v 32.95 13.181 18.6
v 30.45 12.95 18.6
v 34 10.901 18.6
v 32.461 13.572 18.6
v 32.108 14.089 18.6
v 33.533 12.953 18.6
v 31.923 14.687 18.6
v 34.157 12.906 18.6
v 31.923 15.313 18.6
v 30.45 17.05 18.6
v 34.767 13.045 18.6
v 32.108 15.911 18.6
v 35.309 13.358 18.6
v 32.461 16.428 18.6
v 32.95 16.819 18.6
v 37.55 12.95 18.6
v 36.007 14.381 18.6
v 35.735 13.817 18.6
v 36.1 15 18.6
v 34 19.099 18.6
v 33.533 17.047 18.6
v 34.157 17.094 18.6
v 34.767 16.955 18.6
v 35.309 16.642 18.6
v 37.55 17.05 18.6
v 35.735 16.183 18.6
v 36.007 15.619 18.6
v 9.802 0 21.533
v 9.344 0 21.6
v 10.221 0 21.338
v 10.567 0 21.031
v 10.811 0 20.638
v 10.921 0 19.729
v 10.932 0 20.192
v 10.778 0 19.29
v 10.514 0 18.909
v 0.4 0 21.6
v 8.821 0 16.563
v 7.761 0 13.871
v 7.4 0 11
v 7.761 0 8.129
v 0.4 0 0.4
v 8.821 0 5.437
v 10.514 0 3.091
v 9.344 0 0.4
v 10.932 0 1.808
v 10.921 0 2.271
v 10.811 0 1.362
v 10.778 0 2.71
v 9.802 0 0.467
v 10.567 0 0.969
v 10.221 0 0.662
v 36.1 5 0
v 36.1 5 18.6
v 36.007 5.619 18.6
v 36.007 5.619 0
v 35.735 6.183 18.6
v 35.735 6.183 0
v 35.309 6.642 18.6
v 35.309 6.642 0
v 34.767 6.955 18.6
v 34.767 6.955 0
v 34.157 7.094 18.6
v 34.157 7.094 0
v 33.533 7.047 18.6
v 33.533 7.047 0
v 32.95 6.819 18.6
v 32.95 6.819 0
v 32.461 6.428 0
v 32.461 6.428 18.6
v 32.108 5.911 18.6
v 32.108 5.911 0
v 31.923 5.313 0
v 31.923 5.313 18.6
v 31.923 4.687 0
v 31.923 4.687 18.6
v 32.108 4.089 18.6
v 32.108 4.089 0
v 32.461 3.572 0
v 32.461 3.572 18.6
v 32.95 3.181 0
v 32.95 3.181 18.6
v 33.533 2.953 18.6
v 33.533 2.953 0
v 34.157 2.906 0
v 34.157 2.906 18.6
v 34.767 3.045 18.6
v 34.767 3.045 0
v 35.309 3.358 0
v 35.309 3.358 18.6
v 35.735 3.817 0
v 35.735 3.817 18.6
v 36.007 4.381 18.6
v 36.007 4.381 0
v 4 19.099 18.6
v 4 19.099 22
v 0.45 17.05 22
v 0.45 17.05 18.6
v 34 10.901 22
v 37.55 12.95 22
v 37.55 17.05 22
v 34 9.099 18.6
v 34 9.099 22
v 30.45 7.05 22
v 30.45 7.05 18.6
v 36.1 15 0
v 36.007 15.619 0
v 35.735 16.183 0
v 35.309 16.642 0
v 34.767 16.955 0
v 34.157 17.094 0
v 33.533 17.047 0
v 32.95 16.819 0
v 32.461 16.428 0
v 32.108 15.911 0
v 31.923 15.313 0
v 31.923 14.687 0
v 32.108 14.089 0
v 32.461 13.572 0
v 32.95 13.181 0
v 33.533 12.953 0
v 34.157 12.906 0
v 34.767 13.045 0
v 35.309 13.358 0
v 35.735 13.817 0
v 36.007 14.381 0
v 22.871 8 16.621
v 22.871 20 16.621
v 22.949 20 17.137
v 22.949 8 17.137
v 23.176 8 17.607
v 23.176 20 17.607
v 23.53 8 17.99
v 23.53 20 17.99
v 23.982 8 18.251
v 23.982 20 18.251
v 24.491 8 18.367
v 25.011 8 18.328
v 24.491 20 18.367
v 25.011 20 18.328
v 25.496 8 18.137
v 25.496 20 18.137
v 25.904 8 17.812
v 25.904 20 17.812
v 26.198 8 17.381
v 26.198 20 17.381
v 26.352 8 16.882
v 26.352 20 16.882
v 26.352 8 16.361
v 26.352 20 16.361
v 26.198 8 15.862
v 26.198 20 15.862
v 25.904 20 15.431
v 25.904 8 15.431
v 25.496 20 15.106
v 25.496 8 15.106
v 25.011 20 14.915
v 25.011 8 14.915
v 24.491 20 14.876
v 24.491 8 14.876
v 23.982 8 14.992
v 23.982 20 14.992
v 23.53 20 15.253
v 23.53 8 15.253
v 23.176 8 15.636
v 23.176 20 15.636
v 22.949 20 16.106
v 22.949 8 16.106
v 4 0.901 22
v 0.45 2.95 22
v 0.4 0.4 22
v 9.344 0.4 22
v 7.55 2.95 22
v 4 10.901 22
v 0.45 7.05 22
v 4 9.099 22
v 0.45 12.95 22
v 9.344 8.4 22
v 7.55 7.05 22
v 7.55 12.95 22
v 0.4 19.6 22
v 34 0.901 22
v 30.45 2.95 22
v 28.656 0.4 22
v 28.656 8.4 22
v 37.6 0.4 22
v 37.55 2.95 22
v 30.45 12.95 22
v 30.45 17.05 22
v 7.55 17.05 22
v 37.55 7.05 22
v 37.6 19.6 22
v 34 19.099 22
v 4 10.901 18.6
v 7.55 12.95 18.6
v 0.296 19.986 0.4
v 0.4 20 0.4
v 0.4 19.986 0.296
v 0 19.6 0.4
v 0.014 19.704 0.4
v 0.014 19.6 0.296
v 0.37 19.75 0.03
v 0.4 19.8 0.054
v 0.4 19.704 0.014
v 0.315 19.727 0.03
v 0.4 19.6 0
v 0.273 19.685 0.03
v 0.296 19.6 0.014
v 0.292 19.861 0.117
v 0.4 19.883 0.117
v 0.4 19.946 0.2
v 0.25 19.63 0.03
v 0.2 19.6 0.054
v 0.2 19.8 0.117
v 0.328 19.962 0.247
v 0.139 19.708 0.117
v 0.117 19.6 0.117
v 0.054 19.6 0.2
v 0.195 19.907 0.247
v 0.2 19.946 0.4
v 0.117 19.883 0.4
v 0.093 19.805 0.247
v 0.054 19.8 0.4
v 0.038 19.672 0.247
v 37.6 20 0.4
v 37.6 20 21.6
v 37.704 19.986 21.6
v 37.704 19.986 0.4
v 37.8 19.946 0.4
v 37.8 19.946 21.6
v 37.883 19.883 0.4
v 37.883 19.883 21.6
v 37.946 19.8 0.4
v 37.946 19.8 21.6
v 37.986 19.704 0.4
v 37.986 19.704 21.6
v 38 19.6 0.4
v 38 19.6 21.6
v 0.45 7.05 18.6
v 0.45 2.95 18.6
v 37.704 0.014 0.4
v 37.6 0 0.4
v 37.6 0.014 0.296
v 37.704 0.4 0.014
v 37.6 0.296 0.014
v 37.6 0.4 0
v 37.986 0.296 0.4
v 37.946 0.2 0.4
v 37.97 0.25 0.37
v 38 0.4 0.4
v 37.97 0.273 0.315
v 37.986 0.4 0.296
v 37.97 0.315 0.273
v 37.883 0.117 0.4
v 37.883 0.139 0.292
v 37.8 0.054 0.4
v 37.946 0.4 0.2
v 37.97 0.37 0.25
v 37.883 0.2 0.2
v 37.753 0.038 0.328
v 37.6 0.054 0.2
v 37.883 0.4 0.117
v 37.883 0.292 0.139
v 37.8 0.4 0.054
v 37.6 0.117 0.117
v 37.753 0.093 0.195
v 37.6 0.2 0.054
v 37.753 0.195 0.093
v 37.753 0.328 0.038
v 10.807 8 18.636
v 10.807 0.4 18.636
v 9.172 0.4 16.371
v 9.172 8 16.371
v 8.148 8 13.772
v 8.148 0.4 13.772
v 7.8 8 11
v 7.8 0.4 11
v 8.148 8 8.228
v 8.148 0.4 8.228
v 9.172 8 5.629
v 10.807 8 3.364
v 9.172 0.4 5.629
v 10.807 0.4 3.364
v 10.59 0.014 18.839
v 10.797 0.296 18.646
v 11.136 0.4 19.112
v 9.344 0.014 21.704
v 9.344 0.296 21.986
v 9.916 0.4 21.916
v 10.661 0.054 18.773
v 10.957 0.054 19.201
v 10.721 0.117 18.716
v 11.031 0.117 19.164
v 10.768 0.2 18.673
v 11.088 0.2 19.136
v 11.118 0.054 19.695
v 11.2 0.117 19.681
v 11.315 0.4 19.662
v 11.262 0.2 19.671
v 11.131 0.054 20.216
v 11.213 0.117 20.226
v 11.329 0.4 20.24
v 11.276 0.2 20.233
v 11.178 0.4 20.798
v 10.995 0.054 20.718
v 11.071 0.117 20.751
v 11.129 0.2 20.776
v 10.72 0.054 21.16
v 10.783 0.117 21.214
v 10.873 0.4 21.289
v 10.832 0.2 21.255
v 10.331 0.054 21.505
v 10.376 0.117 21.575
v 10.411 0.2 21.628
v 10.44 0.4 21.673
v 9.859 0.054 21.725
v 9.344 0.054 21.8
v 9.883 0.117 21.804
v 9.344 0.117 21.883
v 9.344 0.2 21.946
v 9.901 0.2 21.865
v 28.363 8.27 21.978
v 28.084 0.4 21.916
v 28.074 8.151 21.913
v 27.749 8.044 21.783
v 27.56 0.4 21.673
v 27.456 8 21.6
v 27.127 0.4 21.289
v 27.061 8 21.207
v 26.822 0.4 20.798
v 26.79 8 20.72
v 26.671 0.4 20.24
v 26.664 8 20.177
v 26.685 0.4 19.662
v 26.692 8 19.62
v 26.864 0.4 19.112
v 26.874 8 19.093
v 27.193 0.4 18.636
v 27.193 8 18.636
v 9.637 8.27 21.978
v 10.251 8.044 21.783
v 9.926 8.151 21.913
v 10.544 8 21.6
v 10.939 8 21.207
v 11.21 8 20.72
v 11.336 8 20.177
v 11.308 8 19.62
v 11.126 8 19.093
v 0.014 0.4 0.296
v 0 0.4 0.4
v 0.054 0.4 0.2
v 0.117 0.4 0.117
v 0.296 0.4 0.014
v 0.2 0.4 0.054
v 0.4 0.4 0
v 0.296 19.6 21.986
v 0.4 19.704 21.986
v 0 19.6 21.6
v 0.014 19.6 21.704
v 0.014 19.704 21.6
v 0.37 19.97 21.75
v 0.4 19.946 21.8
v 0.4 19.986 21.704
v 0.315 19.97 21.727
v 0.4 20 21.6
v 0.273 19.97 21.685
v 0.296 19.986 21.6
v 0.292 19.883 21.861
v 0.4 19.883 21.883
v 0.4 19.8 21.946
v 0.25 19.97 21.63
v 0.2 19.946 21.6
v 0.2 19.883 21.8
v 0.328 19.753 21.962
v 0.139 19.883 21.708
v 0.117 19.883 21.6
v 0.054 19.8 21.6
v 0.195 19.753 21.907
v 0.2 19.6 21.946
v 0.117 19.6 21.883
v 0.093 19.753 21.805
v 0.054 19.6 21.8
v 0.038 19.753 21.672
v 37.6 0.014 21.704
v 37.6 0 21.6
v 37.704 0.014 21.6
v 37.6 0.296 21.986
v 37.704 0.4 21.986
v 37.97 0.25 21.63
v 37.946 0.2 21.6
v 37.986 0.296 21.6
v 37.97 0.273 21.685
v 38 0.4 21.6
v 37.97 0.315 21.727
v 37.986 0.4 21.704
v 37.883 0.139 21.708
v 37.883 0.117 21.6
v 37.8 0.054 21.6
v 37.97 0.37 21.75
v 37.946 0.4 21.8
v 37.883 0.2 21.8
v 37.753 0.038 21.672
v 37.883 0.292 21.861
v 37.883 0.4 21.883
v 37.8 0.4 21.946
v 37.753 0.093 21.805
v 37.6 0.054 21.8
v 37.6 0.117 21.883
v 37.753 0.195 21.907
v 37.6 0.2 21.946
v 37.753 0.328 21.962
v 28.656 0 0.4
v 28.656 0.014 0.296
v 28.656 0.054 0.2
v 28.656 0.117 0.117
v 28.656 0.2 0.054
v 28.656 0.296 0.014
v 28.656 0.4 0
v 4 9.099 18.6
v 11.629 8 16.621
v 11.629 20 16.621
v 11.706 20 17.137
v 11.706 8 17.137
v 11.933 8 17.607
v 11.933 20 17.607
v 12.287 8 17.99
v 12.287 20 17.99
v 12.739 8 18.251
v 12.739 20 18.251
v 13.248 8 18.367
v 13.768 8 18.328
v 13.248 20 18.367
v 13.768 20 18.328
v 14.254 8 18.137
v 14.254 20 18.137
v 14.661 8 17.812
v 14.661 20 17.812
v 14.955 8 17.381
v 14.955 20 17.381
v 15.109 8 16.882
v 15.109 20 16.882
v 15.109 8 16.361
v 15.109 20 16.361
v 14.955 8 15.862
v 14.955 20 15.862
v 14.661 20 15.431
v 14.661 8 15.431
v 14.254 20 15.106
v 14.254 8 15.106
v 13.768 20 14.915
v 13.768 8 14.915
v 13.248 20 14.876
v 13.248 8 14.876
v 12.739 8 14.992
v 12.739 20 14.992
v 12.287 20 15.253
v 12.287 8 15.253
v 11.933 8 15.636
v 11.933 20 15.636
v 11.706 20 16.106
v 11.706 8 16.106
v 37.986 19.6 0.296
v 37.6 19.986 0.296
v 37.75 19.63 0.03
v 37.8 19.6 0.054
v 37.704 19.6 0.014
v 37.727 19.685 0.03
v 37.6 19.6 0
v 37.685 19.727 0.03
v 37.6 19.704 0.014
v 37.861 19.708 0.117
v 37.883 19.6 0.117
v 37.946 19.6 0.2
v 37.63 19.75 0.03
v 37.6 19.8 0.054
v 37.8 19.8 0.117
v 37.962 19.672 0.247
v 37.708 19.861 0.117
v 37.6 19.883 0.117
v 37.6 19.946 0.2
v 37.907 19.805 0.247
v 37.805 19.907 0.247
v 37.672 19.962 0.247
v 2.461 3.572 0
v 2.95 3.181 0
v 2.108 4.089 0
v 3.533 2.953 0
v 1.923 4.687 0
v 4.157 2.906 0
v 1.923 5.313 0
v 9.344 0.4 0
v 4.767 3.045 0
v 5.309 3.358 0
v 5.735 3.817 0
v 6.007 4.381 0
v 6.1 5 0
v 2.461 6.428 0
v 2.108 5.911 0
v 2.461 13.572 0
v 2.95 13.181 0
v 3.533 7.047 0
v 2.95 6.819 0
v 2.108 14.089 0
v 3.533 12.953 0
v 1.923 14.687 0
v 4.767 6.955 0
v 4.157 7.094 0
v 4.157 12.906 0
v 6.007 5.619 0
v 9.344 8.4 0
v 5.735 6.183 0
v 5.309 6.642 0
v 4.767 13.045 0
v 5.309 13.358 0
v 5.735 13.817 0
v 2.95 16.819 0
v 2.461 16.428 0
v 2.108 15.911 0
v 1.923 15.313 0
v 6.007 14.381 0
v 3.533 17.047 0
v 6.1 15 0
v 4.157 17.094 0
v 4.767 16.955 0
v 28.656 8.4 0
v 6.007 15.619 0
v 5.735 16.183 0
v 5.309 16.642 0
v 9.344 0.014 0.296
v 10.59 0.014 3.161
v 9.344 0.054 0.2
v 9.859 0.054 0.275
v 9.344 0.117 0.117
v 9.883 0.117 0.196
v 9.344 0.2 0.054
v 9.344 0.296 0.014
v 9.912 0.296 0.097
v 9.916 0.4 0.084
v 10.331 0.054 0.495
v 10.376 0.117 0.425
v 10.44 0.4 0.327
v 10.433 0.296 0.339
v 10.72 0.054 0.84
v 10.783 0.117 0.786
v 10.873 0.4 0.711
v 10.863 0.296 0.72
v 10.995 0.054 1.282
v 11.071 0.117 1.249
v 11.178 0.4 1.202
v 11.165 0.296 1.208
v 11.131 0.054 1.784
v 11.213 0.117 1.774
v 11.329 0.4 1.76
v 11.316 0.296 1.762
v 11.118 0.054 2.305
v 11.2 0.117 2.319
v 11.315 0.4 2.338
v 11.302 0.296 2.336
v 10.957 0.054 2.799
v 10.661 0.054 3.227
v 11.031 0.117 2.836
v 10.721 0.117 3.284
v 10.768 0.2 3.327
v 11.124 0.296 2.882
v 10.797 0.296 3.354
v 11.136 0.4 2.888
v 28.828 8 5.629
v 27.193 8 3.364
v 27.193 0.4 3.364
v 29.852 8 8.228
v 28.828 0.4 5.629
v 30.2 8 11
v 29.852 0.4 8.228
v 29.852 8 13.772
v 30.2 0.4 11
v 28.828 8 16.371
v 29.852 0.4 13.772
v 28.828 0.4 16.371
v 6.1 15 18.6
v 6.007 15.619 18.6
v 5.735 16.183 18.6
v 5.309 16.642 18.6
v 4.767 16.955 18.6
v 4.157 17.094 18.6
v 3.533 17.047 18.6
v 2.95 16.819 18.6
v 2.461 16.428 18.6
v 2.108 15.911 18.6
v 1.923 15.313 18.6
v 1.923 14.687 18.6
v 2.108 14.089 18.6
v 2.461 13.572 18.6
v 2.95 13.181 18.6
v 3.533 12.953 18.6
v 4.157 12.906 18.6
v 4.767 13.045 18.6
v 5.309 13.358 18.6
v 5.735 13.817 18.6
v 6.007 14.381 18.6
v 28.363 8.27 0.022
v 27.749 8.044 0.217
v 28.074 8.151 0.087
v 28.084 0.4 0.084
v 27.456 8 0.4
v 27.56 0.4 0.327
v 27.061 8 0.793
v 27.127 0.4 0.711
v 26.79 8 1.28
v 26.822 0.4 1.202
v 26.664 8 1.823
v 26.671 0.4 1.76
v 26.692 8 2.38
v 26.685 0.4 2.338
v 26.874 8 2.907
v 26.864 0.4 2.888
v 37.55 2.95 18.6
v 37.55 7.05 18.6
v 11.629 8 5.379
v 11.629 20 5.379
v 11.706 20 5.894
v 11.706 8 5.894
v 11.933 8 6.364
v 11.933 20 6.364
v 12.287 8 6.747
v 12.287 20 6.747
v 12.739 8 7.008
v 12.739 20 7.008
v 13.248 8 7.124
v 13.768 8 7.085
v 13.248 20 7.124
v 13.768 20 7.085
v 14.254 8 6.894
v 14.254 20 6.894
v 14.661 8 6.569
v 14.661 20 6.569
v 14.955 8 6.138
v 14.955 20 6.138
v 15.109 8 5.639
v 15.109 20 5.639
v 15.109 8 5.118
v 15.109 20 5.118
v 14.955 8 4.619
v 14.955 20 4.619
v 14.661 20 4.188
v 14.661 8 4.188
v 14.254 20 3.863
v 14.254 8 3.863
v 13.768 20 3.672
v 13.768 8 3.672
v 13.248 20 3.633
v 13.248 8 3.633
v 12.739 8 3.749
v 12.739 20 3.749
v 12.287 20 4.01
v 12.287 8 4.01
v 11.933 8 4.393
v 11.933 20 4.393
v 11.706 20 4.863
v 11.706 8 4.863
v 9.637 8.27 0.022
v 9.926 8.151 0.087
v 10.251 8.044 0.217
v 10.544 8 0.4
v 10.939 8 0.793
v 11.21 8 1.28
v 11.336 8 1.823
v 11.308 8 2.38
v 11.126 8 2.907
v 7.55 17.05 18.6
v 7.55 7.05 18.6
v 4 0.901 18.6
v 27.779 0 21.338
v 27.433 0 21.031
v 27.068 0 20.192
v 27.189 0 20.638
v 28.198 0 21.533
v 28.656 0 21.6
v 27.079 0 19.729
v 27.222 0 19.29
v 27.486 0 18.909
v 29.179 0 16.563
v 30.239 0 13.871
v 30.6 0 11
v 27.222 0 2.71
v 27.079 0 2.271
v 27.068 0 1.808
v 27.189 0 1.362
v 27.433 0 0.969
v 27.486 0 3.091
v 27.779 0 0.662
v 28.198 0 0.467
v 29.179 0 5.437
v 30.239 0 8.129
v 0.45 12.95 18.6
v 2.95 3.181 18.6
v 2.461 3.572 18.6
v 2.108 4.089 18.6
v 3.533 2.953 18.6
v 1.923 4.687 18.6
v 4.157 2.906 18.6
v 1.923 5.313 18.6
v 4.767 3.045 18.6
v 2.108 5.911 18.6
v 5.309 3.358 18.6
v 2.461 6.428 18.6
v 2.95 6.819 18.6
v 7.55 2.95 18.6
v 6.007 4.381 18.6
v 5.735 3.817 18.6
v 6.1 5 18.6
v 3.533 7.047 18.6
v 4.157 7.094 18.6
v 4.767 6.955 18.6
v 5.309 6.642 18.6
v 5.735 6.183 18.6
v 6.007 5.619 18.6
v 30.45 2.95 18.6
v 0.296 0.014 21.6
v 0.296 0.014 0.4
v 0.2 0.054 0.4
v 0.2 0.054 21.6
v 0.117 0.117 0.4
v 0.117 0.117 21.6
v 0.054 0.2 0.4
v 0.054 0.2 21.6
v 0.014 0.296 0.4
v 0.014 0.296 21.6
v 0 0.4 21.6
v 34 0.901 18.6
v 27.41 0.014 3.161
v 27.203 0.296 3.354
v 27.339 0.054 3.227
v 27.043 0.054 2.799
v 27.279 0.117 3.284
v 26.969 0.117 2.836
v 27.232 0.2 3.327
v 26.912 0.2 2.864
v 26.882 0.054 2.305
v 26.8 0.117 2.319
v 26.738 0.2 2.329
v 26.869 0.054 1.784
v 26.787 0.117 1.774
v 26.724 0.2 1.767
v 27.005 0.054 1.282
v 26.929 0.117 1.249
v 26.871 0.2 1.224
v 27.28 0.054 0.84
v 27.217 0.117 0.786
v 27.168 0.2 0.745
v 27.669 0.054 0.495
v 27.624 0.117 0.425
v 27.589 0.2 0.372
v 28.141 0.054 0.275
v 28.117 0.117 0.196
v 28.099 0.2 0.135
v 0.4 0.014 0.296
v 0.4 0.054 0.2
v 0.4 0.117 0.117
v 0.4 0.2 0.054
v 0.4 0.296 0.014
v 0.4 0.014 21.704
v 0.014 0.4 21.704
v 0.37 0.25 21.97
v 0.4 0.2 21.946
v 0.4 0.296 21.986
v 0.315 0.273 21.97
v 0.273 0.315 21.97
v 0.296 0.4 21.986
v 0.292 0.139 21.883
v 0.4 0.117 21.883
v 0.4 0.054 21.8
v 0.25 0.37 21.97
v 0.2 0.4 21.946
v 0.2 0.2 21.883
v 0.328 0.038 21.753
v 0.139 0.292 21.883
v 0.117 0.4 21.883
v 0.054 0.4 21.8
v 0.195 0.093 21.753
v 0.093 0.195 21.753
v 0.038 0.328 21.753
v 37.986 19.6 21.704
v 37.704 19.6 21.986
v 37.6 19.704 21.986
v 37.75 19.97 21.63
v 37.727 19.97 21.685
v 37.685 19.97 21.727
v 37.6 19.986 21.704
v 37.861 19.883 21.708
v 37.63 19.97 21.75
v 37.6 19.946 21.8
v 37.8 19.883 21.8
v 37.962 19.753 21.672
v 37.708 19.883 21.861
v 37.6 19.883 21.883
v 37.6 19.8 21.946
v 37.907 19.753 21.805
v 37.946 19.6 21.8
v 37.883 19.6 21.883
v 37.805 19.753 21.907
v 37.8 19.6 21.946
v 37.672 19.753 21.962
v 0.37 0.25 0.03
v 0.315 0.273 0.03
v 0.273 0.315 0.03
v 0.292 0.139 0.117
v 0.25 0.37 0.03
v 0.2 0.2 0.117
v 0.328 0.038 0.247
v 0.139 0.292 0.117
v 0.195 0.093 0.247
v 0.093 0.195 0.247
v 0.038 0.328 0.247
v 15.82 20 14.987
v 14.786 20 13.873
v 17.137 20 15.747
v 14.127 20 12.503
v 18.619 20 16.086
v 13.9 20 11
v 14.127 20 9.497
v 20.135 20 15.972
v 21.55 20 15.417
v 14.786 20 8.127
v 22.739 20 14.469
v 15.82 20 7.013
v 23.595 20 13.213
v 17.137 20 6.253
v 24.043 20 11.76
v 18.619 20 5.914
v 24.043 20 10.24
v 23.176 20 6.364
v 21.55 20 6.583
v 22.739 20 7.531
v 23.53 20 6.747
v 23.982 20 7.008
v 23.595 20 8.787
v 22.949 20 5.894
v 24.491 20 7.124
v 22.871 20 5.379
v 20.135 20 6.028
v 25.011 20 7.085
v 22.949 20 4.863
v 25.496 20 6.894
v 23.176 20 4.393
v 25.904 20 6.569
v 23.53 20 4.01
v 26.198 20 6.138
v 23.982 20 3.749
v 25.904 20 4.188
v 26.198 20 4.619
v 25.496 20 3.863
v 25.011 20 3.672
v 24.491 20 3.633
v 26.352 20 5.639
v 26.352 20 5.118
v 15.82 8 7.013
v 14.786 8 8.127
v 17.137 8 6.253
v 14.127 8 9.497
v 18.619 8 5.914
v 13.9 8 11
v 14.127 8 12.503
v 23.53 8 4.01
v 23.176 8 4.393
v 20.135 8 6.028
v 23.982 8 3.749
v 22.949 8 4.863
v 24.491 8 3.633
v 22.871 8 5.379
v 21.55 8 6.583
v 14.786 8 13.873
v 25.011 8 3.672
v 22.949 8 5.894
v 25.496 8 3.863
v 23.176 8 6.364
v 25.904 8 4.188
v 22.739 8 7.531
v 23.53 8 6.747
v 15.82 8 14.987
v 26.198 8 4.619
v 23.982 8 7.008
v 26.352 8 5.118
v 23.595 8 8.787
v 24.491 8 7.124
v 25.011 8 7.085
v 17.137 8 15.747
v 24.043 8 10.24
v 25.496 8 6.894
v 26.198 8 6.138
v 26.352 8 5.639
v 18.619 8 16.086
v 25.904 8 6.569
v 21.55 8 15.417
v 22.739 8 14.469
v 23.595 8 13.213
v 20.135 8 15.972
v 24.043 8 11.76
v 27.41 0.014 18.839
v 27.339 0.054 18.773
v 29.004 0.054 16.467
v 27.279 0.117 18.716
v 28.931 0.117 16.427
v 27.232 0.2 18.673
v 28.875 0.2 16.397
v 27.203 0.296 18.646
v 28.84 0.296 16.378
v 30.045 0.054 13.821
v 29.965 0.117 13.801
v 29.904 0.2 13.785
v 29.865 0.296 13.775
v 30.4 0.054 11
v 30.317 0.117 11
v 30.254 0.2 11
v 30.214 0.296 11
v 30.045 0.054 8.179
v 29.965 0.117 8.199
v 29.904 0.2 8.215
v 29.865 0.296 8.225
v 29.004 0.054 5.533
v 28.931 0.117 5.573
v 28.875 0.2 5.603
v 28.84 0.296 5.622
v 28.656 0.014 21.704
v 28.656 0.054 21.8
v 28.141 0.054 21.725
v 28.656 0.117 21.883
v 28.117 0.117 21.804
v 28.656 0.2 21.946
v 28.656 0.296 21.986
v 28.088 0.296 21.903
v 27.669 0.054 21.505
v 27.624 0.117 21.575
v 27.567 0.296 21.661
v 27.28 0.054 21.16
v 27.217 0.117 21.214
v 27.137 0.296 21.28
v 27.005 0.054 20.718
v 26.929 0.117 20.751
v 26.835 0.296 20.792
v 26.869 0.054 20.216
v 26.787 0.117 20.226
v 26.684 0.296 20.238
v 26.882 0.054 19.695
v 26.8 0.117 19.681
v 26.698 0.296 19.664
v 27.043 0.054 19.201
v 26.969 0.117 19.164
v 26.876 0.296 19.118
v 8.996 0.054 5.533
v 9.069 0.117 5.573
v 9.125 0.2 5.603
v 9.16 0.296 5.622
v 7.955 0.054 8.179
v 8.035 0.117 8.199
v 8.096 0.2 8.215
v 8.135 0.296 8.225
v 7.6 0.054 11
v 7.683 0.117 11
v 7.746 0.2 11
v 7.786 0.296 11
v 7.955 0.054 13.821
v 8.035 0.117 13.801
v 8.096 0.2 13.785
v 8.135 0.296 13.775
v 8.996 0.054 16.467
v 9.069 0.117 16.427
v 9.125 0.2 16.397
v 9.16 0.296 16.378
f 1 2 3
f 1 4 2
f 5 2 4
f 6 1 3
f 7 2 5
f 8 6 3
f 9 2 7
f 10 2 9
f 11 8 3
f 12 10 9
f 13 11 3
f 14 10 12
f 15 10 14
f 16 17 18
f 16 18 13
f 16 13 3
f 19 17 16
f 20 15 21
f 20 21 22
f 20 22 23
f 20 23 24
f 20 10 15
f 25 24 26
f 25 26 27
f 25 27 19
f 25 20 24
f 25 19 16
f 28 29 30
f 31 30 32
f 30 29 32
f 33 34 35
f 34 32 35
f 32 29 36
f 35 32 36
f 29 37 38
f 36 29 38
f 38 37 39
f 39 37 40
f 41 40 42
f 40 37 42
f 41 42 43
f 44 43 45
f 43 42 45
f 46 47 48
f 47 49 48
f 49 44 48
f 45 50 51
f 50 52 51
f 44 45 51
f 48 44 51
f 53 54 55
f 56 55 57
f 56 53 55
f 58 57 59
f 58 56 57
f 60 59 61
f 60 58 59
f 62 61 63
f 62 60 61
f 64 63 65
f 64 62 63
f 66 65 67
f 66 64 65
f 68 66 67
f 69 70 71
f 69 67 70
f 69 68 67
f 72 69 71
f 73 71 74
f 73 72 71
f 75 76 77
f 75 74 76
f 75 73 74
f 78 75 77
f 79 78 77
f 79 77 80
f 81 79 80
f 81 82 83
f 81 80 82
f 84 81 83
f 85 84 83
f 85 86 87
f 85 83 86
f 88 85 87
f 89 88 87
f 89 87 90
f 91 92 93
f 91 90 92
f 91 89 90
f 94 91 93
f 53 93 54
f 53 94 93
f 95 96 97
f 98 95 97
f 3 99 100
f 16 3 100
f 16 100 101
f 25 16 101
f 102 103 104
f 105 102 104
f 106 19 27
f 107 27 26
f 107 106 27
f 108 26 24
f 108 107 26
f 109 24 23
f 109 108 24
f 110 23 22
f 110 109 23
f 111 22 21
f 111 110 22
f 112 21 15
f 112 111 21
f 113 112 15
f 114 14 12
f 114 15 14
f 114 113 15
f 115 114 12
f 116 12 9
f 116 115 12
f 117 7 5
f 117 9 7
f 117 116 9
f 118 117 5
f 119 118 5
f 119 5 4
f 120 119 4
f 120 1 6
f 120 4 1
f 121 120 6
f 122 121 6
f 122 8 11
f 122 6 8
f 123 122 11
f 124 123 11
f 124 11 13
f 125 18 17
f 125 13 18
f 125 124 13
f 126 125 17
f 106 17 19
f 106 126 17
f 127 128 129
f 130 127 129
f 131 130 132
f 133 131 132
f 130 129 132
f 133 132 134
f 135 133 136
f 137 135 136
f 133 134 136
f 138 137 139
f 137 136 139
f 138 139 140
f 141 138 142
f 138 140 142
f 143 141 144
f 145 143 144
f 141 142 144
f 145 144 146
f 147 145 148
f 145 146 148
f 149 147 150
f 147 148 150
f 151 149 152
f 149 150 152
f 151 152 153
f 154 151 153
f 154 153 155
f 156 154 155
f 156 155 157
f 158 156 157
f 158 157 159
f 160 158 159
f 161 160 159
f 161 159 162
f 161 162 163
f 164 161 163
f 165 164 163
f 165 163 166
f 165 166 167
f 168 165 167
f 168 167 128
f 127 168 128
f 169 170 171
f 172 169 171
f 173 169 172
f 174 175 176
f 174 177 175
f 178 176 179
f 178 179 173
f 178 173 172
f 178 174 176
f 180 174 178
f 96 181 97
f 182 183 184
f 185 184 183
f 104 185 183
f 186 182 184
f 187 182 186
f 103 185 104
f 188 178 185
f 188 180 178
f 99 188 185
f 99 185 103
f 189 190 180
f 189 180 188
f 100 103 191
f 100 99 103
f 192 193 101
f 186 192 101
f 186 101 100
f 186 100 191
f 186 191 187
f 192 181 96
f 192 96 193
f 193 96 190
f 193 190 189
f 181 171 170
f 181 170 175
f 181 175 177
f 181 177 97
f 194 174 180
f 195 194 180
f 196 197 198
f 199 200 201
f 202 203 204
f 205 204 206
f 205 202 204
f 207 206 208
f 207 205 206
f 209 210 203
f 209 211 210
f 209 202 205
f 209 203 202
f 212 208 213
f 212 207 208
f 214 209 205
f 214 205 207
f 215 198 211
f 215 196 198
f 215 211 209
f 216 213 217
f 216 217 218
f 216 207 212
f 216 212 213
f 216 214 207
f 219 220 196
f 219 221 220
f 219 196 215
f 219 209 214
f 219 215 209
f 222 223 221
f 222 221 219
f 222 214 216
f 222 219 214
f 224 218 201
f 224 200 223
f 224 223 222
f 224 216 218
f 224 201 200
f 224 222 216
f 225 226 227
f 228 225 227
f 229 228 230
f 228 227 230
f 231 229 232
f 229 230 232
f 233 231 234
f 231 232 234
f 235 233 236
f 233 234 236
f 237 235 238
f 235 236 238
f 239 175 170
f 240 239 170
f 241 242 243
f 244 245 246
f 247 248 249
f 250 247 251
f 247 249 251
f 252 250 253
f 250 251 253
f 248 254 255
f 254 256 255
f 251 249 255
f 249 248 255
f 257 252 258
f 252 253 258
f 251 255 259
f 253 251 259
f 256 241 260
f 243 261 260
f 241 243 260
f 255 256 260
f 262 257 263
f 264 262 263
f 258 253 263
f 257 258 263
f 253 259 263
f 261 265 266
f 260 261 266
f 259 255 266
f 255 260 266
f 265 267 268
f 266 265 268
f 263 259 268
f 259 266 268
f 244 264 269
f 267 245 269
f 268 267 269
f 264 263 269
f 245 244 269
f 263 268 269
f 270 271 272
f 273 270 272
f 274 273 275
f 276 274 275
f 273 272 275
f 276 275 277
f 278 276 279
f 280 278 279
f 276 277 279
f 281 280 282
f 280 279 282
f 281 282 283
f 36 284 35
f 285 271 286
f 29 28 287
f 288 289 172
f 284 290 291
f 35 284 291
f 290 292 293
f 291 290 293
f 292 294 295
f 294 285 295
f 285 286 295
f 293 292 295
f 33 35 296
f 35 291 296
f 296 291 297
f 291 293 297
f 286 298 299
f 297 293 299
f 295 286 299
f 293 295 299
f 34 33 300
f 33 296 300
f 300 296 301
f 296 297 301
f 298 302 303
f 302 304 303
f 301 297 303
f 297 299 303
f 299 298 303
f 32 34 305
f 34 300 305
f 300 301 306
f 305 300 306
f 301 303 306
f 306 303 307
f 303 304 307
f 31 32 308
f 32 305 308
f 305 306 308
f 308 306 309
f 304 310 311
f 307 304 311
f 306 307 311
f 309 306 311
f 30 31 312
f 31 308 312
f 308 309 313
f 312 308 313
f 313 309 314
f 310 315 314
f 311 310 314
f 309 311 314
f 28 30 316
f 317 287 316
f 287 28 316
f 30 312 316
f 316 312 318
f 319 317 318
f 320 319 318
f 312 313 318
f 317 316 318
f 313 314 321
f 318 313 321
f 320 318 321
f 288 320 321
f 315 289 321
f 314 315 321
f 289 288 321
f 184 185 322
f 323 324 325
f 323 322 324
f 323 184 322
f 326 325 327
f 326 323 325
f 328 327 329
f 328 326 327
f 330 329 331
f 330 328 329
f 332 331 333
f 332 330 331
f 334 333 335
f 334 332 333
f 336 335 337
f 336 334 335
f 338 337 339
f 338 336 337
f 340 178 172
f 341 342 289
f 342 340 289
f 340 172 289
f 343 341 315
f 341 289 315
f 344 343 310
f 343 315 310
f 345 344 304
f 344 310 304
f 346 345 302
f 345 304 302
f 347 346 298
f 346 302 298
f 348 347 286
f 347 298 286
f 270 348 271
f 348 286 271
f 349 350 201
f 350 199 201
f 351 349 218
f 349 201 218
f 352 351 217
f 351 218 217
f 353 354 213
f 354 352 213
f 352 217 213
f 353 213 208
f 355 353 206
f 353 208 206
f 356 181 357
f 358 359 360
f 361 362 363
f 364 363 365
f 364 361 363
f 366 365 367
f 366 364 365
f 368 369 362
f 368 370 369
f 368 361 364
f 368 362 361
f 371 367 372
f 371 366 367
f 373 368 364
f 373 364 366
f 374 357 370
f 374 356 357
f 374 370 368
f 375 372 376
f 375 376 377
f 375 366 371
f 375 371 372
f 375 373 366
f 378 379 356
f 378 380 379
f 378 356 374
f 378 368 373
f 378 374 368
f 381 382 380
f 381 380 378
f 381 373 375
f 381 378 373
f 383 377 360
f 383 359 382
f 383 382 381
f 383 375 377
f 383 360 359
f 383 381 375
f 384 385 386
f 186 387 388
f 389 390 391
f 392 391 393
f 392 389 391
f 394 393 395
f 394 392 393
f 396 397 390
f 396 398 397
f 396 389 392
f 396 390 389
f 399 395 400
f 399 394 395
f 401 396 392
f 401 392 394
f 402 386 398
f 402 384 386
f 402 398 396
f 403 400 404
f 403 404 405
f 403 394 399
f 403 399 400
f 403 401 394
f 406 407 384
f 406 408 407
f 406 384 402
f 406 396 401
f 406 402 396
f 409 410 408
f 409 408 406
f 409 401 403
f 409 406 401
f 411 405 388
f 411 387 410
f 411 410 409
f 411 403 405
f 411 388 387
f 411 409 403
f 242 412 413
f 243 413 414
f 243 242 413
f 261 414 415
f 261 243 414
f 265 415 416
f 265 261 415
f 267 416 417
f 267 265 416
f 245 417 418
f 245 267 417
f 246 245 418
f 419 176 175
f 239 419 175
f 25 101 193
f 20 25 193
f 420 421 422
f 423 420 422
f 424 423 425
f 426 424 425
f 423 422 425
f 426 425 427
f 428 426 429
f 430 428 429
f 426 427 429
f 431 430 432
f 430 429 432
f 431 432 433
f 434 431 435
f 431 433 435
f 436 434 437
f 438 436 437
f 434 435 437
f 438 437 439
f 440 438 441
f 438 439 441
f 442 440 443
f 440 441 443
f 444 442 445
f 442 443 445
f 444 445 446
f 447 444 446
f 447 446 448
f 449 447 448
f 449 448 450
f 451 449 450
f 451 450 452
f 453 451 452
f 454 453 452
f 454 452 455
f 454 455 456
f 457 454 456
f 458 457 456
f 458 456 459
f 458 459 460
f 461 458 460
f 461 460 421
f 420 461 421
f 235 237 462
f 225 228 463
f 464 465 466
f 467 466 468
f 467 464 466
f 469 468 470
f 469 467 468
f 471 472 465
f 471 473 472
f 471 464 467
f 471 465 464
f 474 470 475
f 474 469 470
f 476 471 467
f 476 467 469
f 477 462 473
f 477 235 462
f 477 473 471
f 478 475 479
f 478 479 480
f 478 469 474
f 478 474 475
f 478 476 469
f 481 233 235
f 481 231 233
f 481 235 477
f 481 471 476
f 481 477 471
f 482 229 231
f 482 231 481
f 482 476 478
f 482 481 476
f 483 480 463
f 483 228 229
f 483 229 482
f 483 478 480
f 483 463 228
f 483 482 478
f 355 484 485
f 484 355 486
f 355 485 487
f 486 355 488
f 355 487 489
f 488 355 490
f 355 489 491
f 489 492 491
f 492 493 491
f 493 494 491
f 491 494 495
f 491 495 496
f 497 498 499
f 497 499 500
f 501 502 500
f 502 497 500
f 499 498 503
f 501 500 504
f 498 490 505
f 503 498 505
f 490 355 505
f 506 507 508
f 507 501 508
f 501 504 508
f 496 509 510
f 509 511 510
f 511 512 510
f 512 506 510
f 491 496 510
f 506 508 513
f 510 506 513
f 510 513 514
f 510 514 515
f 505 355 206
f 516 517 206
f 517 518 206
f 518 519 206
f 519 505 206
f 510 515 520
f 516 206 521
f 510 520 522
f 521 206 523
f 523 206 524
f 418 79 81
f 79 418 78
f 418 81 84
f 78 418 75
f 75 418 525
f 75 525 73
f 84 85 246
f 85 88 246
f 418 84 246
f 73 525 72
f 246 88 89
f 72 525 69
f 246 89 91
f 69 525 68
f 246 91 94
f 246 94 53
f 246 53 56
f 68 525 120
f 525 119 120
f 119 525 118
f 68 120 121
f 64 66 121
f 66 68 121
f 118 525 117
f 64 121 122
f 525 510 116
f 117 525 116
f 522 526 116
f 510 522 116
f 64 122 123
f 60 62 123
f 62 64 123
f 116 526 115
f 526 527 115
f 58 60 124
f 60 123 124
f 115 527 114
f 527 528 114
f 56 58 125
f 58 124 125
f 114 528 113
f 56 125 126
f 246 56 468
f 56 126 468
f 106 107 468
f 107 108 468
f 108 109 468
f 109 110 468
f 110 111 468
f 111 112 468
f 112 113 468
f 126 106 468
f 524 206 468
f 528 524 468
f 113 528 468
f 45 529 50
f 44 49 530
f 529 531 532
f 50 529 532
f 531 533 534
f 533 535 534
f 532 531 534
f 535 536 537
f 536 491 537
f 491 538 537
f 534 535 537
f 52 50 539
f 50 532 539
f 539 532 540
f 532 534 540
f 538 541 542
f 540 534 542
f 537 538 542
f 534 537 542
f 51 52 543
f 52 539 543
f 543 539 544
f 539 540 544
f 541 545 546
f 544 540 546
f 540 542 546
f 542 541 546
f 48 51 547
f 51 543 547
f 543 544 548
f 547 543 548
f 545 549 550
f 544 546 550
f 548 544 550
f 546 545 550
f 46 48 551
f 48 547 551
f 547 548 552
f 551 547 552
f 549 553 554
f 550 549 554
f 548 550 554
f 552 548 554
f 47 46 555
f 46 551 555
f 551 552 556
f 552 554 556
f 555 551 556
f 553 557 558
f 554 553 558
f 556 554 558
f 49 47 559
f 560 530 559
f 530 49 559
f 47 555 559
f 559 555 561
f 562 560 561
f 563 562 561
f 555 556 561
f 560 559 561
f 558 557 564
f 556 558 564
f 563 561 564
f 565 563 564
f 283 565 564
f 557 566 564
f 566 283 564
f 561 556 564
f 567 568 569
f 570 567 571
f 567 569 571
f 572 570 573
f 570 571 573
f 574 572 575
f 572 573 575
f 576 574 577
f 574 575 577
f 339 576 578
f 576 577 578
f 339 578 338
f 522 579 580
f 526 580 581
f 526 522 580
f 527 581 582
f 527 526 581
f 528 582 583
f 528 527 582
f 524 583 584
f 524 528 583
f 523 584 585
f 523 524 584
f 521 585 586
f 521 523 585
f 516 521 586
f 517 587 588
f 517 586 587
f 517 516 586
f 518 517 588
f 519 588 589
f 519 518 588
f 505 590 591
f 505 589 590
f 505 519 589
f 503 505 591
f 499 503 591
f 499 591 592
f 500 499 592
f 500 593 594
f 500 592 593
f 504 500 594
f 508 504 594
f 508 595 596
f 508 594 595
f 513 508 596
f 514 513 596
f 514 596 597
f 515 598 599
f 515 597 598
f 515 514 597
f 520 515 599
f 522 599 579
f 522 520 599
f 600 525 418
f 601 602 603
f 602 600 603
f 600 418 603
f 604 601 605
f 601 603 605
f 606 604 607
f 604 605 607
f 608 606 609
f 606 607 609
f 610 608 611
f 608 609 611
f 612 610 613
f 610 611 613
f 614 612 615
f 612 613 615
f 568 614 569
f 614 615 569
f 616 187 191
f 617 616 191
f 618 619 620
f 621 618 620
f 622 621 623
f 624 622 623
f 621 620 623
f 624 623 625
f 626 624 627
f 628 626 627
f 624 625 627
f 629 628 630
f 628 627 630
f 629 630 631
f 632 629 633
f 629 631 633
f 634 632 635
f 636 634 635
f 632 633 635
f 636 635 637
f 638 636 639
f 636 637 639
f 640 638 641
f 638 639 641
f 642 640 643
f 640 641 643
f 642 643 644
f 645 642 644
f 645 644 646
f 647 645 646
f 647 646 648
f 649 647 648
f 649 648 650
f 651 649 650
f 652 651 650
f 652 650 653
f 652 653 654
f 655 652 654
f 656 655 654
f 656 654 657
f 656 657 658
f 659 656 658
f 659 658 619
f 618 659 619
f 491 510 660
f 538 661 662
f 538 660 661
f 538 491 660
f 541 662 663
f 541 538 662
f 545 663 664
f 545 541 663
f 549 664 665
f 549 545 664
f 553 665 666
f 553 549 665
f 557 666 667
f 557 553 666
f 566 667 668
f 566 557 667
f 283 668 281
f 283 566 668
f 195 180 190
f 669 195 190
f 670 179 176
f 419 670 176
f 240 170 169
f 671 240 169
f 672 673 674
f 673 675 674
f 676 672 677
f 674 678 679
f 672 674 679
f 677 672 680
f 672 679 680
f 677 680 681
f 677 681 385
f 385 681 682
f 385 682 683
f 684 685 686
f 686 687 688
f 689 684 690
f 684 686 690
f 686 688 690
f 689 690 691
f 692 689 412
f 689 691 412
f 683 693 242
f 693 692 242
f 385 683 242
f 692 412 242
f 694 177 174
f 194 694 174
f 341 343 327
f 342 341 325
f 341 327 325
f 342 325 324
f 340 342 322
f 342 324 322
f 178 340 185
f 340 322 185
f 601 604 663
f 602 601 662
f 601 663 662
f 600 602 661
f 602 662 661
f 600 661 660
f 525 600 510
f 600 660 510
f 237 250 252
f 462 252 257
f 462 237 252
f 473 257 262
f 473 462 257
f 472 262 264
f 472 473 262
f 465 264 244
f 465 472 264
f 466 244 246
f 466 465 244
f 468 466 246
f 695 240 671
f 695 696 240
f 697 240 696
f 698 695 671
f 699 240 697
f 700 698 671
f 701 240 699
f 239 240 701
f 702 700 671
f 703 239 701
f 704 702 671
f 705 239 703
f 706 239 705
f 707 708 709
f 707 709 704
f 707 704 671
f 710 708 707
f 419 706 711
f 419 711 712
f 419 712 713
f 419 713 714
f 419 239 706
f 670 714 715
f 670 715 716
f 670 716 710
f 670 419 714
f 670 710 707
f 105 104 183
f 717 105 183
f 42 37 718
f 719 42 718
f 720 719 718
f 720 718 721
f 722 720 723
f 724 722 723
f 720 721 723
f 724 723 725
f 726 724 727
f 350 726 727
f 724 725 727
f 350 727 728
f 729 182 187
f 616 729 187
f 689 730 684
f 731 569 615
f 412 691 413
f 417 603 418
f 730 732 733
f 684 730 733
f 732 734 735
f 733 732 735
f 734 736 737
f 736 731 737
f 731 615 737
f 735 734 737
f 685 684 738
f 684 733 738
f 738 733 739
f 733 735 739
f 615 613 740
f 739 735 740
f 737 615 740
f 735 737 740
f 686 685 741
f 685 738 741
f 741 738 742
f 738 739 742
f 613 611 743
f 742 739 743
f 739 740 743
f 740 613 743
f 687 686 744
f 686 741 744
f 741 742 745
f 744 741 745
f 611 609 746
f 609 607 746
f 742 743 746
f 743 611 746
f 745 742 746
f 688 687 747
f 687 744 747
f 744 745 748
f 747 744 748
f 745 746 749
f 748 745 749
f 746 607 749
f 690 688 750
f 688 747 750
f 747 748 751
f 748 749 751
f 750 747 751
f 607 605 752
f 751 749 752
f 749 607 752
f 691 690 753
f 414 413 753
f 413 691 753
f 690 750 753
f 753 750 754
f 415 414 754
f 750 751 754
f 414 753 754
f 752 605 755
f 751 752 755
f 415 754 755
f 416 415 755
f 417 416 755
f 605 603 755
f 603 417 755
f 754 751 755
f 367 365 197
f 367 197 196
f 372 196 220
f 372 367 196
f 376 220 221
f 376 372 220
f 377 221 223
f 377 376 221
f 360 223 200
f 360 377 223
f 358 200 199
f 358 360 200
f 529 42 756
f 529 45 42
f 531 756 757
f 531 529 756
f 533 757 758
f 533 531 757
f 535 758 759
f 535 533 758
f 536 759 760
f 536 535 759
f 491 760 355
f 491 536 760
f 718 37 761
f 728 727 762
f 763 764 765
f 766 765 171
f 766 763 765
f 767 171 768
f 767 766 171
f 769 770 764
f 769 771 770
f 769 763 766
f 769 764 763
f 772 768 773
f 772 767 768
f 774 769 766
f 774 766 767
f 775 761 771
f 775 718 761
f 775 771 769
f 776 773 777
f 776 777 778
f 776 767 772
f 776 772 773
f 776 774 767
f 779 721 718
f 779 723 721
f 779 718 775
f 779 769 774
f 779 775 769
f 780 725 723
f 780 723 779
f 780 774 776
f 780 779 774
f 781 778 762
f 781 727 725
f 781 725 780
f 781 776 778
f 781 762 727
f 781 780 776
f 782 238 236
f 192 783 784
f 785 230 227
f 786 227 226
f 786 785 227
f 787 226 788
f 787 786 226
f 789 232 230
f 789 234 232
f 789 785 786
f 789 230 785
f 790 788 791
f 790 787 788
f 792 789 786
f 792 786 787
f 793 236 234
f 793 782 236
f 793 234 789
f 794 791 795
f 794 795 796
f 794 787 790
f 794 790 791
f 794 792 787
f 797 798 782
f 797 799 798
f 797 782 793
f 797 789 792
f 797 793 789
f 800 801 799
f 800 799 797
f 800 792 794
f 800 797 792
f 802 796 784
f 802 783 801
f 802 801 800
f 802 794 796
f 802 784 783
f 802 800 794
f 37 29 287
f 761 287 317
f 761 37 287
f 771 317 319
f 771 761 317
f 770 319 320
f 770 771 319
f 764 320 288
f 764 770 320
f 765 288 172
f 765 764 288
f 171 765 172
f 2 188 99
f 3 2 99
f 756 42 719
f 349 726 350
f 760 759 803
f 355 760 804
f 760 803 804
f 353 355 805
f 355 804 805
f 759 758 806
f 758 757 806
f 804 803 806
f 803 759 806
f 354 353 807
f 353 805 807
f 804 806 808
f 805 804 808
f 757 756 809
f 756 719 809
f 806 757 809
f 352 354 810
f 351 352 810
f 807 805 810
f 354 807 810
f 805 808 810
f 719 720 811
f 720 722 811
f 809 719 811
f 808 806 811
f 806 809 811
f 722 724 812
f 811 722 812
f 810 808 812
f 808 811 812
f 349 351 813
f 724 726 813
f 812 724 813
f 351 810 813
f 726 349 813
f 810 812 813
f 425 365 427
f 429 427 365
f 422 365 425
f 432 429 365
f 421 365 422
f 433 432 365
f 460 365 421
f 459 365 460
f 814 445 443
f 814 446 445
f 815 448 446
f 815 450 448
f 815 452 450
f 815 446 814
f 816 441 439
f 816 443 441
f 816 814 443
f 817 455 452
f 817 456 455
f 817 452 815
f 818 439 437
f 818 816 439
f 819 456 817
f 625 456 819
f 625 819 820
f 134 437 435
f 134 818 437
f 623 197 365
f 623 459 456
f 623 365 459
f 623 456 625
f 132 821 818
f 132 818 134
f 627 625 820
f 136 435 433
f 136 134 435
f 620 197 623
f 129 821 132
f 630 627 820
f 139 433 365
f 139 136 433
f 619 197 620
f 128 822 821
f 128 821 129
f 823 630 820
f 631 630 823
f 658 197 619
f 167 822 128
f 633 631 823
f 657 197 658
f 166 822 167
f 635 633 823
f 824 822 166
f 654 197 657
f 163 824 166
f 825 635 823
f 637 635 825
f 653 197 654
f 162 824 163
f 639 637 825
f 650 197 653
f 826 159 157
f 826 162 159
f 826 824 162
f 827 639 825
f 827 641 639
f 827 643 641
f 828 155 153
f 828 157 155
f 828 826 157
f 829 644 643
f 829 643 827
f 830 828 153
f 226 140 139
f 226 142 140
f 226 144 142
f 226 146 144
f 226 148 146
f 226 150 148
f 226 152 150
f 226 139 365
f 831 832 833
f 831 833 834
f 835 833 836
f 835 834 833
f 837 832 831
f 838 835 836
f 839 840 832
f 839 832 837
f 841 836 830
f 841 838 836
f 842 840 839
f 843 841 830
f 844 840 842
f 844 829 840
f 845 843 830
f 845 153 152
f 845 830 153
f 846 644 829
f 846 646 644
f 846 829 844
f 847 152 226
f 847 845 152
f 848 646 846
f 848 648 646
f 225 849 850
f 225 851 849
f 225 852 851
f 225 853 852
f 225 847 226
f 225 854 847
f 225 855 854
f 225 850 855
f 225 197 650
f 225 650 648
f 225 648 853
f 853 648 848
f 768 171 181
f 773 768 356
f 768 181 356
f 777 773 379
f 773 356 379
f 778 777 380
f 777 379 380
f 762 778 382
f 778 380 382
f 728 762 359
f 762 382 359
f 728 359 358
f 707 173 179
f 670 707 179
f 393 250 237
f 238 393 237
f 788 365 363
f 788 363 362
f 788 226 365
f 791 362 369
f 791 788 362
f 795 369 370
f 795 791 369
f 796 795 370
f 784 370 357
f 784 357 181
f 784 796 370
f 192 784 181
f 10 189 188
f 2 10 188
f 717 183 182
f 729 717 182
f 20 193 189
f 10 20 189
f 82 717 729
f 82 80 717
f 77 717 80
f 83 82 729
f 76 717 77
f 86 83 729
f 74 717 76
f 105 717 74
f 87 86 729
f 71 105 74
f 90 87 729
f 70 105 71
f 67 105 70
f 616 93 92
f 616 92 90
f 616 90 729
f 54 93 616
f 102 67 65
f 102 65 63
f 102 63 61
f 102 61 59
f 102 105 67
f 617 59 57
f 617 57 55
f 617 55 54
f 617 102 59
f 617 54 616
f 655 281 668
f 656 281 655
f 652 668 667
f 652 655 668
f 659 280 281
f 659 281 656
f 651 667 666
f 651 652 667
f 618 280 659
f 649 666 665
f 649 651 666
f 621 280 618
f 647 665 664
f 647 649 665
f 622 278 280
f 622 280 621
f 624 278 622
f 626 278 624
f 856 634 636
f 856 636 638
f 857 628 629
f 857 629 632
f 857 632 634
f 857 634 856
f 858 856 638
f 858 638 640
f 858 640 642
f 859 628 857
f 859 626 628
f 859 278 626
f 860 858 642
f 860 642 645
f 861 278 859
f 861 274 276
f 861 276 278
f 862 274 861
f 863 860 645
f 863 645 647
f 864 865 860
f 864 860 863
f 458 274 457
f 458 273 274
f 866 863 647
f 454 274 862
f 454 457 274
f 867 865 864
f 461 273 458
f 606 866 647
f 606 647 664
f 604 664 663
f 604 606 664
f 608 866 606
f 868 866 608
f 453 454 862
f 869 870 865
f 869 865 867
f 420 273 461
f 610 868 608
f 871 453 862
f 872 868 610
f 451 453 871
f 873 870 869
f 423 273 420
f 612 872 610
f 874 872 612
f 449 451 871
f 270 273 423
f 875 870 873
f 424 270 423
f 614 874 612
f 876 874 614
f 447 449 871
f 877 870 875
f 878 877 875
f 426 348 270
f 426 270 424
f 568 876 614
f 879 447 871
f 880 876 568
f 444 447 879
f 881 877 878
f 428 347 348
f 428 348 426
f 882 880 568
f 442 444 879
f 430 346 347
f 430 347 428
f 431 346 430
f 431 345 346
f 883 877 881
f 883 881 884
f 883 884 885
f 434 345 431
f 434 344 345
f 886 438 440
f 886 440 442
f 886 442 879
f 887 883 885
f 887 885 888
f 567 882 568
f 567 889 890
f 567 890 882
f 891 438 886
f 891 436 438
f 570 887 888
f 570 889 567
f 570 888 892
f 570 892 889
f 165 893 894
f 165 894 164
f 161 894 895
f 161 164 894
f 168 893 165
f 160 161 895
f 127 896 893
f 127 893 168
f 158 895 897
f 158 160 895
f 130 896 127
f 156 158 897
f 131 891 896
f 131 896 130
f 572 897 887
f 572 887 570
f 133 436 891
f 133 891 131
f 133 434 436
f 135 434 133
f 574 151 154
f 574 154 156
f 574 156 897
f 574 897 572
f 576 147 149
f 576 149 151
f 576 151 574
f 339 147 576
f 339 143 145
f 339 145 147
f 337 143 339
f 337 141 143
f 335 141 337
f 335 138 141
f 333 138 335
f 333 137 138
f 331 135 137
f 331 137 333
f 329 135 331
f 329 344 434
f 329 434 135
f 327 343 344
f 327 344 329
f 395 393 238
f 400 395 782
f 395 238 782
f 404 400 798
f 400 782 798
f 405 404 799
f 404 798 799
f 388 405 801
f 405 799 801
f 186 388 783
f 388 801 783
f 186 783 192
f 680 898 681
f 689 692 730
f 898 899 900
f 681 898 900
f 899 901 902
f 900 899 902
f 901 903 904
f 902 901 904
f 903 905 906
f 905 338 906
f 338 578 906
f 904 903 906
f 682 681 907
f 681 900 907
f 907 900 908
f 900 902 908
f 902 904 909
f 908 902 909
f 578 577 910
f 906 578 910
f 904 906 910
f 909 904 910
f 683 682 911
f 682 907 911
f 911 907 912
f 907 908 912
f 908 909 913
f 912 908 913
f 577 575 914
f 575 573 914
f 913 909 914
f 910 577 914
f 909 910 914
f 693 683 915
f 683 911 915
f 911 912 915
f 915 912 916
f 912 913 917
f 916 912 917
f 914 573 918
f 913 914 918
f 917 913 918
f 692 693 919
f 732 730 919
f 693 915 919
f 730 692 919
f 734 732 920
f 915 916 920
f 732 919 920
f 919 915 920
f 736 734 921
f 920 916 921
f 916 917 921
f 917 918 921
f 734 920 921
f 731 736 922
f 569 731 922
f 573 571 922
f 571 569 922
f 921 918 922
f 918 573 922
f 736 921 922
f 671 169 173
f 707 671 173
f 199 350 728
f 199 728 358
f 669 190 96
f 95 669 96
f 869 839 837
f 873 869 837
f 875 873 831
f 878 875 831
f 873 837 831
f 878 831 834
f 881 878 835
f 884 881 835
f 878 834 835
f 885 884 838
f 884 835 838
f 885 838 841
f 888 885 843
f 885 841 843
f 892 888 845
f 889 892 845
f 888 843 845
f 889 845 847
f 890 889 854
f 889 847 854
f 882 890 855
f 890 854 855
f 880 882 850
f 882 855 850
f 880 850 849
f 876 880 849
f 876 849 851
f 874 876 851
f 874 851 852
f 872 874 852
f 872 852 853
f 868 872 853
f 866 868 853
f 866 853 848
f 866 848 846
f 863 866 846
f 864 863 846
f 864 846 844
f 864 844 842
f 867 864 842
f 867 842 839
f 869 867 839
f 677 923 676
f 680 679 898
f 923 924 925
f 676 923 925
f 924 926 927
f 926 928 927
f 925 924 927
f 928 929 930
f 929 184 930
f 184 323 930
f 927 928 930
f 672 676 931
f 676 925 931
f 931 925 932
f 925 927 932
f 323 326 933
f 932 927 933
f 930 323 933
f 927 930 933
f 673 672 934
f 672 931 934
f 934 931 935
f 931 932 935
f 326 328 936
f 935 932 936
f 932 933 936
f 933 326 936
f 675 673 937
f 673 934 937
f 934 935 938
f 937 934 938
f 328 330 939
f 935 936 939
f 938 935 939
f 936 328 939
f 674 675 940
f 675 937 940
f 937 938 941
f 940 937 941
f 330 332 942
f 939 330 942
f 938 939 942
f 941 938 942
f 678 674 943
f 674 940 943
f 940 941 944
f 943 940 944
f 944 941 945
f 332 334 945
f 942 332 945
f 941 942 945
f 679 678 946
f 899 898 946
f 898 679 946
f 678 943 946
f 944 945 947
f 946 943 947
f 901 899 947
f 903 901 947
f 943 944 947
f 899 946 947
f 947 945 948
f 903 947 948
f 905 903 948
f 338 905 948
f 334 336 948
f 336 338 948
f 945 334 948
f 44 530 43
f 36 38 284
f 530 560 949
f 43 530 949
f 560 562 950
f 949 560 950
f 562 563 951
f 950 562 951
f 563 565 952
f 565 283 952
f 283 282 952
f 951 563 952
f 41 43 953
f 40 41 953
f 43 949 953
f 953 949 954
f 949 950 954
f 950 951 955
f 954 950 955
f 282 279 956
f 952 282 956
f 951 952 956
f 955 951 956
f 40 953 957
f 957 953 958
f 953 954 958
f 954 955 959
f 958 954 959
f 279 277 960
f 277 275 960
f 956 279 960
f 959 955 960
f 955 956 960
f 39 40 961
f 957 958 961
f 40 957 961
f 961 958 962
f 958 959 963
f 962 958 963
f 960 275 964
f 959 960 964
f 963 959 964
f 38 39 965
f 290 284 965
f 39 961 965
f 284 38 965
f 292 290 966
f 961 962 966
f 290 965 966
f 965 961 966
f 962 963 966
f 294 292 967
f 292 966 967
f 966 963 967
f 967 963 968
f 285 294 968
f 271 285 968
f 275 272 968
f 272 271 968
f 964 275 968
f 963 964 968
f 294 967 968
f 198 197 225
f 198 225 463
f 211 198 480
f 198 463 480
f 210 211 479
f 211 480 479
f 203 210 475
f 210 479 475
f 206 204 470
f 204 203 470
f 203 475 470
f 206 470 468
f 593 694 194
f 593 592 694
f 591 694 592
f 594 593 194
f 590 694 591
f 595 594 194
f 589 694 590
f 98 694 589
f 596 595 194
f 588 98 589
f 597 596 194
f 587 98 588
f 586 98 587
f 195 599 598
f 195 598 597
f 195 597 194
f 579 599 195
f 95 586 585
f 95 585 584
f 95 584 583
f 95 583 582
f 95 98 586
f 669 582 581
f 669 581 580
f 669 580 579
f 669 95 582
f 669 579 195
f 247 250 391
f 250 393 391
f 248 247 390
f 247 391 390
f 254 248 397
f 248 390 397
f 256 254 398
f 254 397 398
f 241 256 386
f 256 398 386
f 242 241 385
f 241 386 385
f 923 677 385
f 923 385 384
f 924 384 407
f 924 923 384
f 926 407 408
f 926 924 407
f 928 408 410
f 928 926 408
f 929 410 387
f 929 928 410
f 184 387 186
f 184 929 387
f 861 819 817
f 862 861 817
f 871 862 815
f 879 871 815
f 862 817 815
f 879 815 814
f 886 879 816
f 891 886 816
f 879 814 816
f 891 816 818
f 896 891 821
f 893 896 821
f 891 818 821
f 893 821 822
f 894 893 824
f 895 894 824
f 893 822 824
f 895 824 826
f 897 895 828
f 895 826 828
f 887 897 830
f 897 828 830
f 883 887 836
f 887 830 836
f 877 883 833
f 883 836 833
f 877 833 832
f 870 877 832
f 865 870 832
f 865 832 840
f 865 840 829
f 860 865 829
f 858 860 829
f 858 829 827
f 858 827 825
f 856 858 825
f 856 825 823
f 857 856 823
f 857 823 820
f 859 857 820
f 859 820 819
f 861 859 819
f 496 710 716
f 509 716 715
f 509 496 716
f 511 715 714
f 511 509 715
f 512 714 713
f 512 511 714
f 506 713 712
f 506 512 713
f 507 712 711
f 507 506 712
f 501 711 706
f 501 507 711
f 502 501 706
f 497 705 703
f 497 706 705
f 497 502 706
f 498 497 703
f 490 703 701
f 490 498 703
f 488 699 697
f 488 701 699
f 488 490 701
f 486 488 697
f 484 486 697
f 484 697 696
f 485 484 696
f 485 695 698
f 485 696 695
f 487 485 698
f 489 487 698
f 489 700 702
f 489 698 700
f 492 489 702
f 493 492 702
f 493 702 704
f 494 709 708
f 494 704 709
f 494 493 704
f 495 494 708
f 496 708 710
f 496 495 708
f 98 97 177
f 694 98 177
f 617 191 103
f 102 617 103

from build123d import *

# Parameters (mm, degrees)
SKETCH_W        = 38
SKETCH_H        = 20
SKETCH_R        = 2.1
PAD_DEPTH       = 22
SKETCH001_R     = 11.2
POCKET_DEPTH    = 8
SKETCH002_R     = 5.1
SKETCH002_R_2   = 1.75
POCKET001_DEPTH = 20
POCKET002_DEPTH = 3.4
FILLET_R        = 2
FILLET001_R     = 0.4


with BuildPart() as part:
    # Sketch → Pad (new body)
    with BuildSketch(Plane.XY):
        with Locations((19, 10)):
            Rectangle(SKETCH_W, SKETCH_H)
        with Locations((4, 15)):
            Circle(SKETCH_R, mode=Mode.SUBTRACT)
        with Locations((4, 5)):
            Circle(SKETCH_R, mode=Mode.SUBTRACT)
        with Locations((34, 15)):
            Circle(SKETCH_R, mode=Mode.SUBTRACT)
        with Locations((34, 5)):
            Circle(SKETCH_R, mode=Mode.SUBTRACT)
    extrude(amount=PAD_DEPTH)

    # Sketch001 (on Face3 of Pad) → Pocket (cut)
    with BuildSketch(Plane.XZ):
        with Locations((19, 11)):
            Circle(SKETCH001_R)
    extrude(amount=-POCKET_DEPTH, mode=Mode.SUBTRACT)

    # Sketch002 (on Face1 of Pocket) → Pocket001 (cut)
    with BuildSketch(Plane(origin=(0, 20, 0), x_dir=(-1, 0, 0), z_dir=(0, 1, 0))):
        with Locations((-19, 11)):
            Circle(SKETCH002_R)
        with Locations((-13.378501, 16.621499)):
            Circle(SKETCH002_R_2)
        with Locations((-24.621499, 5.378501)):
            Circle(SKETCH002_R_2)
        with Locations((-24.621499, 16.621499)):
            Circle(SKETCH002_R_2)
        with Locations((-13.378501, 5.378501)):
            Circle(SKETCH002_R_2)
    extrude(amount=-POCKET001_DEPTH, mode=Mode.SUBTRACT)

    # Sketch003 (on Face4 of Pocket001) → Pocket002 (cut)
    with BuildSketch(Plane.XY.offset(22)):
        Polygon((4, 10.900813), (7.55, 12.950407), (7.55, 17.049593), (4, 19.099187), (0.45, 17.049593), (0.45, 12.950407), align=None)
        Polygon((34, 10.900813), (37.55, 12.950407), (37.55, 17.049593), (34, 19.099187), (30.45, 17.049593), (30.45, 12.950407), align=None)
        Polygon((34, 9.099187), (30.45, 7.049593), (30.45, 2.950407), (34, 0.900813), (37.55, 2.950407), (37.55, 7.049593), align=None)
        Polygon((4, 9.099187), (0.45, 7.049593), (0.45, 2.950407), (4, 0.900813), (7.55, 2.950407), (7.55, 7.049593), align=None)
    extrude(amount=-POCKET002_DEPTH, mode=Mode.SUBTRACT)

    # Fillet
    fillet_edges = [part.edges().sort_by_distance(p)[0] for p in [
        (16.892869, 4, 22),
        (21.107131, 4, 22),
        (21.107131, 4, 0),
        (16.892869, 4, 0),
    ]]
    fillet(fillet_edges, radius=FILLET_R)

    # Fillet001
    fillet001_edges = [part.edges().sort_by_distance(p)[0] for p in [
        (19, 8, 22),
        (13.118392, 8, 22),
        (24.881608, 8, 22),
        (0, 0, 11),
        (33.328043, 0, 0),
        (4.671957, 0, 0),
        (4.671957, 0, 22),
        (33.328043, 0, 22),
        (26.822064, 0, 20.797724),
        (29.421182, 0, 15.10353),
        (29.421182, 0, 6.89647),
        (26.822064, 0, 1.202276),
        (11.177936, 0, 1.202276),
        (7.8, 0, 11),
        (11.177936, 0, 20.797724),
        (38, 0, 11),
        (38, 10, 22),
        (38, 20, 11),
        (38, 10, 0),
        (0, 10, 22),
        (19, 20, 22),
        (0, 20, 11),
        (19, 20, 0),
        (0, 10, 0),
        (13.118392, 8, 0),
        (19, 8, 0),
        (24.881608, 8, 0),
    ]]
    fillet(fillet001_edges, radius=FILLET001_R)


solid = part.part
